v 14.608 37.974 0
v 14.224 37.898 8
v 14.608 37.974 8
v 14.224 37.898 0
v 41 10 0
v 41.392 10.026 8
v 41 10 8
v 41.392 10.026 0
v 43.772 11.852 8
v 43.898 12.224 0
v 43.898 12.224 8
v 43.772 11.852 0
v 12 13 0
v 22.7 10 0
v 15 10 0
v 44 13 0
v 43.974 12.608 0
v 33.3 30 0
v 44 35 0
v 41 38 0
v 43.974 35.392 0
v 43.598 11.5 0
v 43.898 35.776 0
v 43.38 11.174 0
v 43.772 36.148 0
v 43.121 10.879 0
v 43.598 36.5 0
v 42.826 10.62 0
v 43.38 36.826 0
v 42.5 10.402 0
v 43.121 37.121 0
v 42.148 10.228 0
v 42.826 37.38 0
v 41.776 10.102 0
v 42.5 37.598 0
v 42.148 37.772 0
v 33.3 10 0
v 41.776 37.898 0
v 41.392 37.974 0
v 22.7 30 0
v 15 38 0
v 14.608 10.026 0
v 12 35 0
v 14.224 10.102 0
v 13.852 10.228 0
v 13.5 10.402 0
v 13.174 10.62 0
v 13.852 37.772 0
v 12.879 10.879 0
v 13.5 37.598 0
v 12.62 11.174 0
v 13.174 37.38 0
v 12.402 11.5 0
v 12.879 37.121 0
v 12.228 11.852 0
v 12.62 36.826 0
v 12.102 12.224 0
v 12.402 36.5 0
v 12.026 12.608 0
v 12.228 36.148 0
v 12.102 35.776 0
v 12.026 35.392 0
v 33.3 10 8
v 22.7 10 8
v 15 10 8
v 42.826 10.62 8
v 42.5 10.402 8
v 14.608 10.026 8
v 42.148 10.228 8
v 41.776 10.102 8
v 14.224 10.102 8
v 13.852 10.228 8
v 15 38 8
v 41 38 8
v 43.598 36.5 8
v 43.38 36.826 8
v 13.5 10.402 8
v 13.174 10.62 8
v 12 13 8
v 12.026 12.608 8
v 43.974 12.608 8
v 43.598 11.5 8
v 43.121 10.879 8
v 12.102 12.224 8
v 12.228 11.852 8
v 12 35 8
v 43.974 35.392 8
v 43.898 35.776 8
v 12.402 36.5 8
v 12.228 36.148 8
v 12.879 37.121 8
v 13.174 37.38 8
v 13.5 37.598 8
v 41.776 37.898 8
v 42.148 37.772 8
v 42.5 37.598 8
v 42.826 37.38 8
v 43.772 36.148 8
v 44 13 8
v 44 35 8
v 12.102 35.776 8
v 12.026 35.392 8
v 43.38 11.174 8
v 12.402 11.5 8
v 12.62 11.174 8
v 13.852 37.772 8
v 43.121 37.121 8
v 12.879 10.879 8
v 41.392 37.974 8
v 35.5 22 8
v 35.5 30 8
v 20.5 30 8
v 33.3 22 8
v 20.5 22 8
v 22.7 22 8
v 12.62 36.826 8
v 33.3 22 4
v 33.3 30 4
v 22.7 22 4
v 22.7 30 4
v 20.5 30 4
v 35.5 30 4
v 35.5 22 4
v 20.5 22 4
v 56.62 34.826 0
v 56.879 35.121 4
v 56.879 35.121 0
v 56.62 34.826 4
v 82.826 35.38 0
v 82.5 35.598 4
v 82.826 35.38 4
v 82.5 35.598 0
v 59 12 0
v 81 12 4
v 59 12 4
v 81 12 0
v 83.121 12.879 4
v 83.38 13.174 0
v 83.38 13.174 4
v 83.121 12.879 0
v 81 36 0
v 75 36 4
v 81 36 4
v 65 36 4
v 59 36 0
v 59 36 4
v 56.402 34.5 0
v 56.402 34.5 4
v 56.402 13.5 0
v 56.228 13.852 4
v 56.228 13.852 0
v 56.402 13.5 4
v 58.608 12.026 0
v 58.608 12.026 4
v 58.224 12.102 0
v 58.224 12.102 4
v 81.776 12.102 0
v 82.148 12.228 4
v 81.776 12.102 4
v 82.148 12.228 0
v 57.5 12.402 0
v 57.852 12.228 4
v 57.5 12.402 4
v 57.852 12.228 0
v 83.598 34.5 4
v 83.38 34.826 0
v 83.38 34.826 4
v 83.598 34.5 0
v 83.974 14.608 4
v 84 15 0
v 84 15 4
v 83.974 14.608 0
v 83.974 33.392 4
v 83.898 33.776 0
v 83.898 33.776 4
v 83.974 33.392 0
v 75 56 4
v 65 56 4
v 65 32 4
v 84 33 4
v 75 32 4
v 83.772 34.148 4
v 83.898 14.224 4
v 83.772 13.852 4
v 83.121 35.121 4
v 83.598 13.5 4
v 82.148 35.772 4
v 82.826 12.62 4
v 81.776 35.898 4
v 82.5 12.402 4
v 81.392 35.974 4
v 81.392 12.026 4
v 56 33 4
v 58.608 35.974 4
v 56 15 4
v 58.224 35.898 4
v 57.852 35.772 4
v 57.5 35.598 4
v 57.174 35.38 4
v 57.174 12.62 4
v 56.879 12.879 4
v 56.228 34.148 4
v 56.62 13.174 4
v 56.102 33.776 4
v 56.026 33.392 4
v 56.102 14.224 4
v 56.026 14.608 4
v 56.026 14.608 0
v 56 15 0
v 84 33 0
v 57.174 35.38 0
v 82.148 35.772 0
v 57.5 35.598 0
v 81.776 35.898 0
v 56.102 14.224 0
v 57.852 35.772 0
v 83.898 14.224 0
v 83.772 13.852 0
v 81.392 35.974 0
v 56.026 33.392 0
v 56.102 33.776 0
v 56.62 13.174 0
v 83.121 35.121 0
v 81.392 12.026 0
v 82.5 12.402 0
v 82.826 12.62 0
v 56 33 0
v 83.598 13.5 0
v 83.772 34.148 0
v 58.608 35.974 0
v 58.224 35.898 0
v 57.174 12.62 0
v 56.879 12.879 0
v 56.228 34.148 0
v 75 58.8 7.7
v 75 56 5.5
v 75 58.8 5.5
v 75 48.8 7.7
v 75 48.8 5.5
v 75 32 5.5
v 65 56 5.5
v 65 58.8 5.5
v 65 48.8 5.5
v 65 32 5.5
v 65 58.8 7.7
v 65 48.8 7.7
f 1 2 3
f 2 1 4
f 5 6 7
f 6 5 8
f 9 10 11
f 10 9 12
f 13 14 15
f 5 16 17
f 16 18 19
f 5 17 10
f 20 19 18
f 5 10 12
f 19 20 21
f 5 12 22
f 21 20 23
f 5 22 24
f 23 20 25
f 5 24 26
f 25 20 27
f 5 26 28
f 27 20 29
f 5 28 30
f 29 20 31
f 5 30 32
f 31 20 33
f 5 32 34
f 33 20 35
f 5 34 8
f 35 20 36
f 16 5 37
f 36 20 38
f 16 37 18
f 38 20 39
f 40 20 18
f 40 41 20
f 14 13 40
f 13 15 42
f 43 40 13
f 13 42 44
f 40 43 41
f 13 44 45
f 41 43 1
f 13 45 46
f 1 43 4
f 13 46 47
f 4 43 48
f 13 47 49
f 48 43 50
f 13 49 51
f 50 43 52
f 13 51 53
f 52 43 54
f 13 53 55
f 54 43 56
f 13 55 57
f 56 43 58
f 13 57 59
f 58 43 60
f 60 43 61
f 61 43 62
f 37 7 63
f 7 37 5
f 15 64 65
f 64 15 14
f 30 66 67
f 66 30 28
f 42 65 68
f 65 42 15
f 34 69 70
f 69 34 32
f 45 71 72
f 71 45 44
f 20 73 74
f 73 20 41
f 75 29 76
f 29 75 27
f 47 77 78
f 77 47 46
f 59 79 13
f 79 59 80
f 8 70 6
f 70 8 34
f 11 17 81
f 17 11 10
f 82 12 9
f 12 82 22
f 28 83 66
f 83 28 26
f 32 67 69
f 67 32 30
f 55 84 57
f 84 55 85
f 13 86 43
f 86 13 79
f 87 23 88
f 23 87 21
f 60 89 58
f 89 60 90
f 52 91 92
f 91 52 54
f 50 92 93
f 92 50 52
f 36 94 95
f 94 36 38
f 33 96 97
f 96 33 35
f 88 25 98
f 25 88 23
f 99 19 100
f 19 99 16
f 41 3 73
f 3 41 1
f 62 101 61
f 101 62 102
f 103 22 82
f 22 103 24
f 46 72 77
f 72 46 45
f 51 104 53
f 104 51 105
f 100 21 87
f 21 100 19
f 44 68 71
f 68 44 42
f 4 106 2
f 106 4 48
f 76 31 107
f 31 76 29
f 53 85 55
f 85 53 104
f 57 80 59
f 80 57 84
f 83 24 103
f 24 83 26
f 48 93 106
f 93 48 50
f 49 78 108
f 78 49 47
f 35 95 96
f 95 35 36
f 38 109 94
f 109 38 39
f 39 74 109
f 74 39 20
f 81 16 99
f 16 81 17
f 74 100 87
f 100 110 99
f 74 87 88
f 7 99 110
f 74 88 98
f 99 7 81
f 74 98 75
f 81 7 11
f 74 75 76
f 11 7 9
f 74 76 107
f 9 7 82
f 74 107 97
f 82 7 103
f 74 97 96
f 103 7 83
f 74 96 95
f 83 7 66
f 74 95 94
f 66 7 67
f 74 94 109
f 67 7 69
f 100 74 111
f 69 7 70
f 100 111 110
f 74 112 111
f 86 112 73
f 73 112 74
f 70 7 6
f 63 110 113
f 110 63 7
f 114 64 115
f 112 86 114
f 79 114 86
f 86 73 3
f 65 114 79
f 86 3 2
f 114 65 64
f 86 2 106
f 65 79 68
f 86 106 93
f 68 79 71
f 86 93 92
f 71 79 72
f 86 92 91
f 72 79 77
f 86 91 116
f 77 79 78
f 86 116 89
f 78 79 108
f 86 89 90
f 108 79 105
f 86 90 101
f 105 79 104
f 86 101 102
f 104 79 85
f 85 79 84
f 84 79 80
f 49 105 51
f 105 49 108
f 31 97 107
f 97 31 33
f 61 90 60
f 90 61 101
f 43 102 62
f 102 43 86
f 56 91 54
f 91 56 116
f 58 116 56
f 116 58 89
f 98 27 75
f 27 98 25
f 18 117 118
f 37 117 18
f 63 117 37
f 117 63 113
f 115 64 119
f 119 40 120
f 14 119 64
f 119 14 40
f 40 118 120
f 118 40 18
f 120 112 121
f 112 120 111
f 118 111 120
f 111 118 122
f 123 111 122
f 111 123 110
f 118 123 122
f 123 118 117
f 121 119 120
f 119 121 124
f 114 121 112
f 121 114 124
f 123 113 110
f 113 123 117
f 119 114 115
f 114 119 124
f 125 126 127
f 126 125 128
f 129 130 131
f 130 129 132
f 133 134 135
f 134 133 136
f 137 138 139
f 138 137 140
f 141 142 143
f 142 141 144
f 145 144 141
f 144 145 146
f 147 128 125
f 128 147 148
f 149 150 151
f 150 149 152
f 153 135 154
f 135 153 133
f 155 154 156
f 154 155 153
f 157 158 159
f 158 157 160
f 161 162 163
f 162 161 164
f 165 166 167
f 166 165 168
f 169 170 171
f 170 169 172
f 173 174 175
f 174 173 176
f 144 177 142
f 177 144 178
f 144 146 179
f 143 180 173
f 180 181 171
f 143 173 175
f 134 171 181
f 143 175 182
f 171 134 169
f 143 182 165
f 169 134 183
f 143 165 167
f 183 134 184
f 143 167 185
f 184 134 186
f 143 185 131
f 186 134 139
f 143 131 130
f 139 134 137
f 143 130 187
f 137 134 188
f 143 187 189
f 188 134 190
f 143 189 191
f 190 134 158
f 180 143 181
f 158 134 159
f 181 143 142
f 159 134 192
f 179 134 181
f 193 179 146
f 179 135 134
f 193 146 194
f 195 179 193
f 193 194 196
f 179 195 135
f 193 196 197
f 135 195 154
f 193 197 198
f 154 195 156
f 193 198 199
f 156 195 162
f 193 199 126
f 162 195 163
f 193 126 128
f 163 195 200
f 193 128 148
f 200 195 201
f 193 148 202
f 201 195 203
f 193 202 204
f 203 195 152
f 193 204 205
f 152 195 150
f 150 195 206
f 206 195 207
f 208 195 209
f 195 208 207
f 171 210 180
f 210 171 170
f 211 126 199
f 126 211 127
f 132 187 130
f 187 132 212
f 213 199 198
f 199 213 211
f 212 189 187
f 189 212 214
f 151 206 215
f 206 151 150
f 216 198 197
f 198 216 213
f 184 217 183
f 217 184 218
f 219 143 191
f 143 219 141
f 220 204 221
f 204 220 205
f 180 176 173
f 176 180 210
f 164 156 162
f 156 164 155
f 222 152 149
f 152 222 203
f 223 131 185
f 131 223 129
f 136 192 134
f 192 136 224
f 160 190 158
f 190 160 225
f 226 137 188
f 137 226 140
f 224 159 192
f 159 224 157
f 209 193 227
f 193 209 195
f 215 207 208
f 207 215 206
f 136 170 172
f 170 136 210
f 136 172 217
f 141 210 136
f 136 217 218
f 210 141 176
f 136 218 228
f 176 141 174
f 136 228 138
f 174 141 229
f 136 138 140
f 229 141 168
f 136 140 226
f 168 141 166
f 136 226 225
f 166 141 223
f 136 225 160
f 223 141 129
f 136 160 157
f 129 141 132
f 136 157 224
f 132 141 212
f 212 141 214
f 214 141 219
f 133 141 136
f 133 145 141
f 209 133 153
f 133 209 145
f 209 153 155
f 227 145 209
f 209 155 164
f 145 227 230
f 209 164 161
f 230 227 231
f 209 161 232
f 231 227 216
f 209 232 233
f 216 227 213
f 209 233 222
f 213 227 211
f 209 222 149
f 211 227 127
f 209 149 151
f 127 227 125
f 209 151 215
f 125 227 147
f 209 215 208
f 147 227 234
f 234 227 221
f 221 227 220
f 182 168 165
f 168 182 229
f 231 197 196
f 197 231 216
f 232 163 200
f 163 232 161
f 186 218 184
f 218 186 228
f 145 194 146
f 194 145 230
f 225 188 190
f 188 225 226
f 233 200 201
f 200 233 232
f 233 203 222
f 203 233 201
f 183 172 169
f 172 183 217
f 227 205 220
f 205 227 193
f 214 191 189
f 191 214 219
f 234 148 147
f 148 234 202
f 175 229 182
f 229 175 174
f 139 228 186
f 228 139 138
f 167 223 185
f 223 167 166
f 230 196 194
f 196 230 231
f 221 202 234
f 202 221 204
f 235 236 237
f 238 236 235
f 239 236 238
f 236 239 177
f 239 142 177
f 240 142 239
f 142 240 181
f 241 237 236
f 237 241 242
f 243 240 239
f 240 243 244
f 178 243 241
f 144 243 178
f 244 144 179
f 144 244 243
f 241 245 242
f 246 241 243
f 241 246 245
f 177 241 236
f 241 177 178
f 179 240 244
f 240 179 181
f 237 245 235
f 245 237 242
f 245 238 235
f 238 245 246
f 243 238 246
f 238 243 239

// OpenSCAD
/*
Sample 072: Wiederlösbarer Kragarm-Schnapper — kräftig 1,5 mm
Generated from the FDM Mechanical Sample Library.
Units: millimetres.

Override examples:
  openscad -o custom.stl -D 'view="plate"' -D 'render_fn=64' model.scad
  openscad -o preview.png -D 'view="assembly"' model.scad
*/
use <../../../library/fdm_mechanisms.scad>

render_fn = is_undef(render_fn) ? 48 : render_fn;
view = is_undef(view) ? "plate" : view;
$fn = render_fn;

sample_cantilever_snap(
    view=view,
    beam_t=1.5,
    clearance=0.3,
    hook=2.2
);
